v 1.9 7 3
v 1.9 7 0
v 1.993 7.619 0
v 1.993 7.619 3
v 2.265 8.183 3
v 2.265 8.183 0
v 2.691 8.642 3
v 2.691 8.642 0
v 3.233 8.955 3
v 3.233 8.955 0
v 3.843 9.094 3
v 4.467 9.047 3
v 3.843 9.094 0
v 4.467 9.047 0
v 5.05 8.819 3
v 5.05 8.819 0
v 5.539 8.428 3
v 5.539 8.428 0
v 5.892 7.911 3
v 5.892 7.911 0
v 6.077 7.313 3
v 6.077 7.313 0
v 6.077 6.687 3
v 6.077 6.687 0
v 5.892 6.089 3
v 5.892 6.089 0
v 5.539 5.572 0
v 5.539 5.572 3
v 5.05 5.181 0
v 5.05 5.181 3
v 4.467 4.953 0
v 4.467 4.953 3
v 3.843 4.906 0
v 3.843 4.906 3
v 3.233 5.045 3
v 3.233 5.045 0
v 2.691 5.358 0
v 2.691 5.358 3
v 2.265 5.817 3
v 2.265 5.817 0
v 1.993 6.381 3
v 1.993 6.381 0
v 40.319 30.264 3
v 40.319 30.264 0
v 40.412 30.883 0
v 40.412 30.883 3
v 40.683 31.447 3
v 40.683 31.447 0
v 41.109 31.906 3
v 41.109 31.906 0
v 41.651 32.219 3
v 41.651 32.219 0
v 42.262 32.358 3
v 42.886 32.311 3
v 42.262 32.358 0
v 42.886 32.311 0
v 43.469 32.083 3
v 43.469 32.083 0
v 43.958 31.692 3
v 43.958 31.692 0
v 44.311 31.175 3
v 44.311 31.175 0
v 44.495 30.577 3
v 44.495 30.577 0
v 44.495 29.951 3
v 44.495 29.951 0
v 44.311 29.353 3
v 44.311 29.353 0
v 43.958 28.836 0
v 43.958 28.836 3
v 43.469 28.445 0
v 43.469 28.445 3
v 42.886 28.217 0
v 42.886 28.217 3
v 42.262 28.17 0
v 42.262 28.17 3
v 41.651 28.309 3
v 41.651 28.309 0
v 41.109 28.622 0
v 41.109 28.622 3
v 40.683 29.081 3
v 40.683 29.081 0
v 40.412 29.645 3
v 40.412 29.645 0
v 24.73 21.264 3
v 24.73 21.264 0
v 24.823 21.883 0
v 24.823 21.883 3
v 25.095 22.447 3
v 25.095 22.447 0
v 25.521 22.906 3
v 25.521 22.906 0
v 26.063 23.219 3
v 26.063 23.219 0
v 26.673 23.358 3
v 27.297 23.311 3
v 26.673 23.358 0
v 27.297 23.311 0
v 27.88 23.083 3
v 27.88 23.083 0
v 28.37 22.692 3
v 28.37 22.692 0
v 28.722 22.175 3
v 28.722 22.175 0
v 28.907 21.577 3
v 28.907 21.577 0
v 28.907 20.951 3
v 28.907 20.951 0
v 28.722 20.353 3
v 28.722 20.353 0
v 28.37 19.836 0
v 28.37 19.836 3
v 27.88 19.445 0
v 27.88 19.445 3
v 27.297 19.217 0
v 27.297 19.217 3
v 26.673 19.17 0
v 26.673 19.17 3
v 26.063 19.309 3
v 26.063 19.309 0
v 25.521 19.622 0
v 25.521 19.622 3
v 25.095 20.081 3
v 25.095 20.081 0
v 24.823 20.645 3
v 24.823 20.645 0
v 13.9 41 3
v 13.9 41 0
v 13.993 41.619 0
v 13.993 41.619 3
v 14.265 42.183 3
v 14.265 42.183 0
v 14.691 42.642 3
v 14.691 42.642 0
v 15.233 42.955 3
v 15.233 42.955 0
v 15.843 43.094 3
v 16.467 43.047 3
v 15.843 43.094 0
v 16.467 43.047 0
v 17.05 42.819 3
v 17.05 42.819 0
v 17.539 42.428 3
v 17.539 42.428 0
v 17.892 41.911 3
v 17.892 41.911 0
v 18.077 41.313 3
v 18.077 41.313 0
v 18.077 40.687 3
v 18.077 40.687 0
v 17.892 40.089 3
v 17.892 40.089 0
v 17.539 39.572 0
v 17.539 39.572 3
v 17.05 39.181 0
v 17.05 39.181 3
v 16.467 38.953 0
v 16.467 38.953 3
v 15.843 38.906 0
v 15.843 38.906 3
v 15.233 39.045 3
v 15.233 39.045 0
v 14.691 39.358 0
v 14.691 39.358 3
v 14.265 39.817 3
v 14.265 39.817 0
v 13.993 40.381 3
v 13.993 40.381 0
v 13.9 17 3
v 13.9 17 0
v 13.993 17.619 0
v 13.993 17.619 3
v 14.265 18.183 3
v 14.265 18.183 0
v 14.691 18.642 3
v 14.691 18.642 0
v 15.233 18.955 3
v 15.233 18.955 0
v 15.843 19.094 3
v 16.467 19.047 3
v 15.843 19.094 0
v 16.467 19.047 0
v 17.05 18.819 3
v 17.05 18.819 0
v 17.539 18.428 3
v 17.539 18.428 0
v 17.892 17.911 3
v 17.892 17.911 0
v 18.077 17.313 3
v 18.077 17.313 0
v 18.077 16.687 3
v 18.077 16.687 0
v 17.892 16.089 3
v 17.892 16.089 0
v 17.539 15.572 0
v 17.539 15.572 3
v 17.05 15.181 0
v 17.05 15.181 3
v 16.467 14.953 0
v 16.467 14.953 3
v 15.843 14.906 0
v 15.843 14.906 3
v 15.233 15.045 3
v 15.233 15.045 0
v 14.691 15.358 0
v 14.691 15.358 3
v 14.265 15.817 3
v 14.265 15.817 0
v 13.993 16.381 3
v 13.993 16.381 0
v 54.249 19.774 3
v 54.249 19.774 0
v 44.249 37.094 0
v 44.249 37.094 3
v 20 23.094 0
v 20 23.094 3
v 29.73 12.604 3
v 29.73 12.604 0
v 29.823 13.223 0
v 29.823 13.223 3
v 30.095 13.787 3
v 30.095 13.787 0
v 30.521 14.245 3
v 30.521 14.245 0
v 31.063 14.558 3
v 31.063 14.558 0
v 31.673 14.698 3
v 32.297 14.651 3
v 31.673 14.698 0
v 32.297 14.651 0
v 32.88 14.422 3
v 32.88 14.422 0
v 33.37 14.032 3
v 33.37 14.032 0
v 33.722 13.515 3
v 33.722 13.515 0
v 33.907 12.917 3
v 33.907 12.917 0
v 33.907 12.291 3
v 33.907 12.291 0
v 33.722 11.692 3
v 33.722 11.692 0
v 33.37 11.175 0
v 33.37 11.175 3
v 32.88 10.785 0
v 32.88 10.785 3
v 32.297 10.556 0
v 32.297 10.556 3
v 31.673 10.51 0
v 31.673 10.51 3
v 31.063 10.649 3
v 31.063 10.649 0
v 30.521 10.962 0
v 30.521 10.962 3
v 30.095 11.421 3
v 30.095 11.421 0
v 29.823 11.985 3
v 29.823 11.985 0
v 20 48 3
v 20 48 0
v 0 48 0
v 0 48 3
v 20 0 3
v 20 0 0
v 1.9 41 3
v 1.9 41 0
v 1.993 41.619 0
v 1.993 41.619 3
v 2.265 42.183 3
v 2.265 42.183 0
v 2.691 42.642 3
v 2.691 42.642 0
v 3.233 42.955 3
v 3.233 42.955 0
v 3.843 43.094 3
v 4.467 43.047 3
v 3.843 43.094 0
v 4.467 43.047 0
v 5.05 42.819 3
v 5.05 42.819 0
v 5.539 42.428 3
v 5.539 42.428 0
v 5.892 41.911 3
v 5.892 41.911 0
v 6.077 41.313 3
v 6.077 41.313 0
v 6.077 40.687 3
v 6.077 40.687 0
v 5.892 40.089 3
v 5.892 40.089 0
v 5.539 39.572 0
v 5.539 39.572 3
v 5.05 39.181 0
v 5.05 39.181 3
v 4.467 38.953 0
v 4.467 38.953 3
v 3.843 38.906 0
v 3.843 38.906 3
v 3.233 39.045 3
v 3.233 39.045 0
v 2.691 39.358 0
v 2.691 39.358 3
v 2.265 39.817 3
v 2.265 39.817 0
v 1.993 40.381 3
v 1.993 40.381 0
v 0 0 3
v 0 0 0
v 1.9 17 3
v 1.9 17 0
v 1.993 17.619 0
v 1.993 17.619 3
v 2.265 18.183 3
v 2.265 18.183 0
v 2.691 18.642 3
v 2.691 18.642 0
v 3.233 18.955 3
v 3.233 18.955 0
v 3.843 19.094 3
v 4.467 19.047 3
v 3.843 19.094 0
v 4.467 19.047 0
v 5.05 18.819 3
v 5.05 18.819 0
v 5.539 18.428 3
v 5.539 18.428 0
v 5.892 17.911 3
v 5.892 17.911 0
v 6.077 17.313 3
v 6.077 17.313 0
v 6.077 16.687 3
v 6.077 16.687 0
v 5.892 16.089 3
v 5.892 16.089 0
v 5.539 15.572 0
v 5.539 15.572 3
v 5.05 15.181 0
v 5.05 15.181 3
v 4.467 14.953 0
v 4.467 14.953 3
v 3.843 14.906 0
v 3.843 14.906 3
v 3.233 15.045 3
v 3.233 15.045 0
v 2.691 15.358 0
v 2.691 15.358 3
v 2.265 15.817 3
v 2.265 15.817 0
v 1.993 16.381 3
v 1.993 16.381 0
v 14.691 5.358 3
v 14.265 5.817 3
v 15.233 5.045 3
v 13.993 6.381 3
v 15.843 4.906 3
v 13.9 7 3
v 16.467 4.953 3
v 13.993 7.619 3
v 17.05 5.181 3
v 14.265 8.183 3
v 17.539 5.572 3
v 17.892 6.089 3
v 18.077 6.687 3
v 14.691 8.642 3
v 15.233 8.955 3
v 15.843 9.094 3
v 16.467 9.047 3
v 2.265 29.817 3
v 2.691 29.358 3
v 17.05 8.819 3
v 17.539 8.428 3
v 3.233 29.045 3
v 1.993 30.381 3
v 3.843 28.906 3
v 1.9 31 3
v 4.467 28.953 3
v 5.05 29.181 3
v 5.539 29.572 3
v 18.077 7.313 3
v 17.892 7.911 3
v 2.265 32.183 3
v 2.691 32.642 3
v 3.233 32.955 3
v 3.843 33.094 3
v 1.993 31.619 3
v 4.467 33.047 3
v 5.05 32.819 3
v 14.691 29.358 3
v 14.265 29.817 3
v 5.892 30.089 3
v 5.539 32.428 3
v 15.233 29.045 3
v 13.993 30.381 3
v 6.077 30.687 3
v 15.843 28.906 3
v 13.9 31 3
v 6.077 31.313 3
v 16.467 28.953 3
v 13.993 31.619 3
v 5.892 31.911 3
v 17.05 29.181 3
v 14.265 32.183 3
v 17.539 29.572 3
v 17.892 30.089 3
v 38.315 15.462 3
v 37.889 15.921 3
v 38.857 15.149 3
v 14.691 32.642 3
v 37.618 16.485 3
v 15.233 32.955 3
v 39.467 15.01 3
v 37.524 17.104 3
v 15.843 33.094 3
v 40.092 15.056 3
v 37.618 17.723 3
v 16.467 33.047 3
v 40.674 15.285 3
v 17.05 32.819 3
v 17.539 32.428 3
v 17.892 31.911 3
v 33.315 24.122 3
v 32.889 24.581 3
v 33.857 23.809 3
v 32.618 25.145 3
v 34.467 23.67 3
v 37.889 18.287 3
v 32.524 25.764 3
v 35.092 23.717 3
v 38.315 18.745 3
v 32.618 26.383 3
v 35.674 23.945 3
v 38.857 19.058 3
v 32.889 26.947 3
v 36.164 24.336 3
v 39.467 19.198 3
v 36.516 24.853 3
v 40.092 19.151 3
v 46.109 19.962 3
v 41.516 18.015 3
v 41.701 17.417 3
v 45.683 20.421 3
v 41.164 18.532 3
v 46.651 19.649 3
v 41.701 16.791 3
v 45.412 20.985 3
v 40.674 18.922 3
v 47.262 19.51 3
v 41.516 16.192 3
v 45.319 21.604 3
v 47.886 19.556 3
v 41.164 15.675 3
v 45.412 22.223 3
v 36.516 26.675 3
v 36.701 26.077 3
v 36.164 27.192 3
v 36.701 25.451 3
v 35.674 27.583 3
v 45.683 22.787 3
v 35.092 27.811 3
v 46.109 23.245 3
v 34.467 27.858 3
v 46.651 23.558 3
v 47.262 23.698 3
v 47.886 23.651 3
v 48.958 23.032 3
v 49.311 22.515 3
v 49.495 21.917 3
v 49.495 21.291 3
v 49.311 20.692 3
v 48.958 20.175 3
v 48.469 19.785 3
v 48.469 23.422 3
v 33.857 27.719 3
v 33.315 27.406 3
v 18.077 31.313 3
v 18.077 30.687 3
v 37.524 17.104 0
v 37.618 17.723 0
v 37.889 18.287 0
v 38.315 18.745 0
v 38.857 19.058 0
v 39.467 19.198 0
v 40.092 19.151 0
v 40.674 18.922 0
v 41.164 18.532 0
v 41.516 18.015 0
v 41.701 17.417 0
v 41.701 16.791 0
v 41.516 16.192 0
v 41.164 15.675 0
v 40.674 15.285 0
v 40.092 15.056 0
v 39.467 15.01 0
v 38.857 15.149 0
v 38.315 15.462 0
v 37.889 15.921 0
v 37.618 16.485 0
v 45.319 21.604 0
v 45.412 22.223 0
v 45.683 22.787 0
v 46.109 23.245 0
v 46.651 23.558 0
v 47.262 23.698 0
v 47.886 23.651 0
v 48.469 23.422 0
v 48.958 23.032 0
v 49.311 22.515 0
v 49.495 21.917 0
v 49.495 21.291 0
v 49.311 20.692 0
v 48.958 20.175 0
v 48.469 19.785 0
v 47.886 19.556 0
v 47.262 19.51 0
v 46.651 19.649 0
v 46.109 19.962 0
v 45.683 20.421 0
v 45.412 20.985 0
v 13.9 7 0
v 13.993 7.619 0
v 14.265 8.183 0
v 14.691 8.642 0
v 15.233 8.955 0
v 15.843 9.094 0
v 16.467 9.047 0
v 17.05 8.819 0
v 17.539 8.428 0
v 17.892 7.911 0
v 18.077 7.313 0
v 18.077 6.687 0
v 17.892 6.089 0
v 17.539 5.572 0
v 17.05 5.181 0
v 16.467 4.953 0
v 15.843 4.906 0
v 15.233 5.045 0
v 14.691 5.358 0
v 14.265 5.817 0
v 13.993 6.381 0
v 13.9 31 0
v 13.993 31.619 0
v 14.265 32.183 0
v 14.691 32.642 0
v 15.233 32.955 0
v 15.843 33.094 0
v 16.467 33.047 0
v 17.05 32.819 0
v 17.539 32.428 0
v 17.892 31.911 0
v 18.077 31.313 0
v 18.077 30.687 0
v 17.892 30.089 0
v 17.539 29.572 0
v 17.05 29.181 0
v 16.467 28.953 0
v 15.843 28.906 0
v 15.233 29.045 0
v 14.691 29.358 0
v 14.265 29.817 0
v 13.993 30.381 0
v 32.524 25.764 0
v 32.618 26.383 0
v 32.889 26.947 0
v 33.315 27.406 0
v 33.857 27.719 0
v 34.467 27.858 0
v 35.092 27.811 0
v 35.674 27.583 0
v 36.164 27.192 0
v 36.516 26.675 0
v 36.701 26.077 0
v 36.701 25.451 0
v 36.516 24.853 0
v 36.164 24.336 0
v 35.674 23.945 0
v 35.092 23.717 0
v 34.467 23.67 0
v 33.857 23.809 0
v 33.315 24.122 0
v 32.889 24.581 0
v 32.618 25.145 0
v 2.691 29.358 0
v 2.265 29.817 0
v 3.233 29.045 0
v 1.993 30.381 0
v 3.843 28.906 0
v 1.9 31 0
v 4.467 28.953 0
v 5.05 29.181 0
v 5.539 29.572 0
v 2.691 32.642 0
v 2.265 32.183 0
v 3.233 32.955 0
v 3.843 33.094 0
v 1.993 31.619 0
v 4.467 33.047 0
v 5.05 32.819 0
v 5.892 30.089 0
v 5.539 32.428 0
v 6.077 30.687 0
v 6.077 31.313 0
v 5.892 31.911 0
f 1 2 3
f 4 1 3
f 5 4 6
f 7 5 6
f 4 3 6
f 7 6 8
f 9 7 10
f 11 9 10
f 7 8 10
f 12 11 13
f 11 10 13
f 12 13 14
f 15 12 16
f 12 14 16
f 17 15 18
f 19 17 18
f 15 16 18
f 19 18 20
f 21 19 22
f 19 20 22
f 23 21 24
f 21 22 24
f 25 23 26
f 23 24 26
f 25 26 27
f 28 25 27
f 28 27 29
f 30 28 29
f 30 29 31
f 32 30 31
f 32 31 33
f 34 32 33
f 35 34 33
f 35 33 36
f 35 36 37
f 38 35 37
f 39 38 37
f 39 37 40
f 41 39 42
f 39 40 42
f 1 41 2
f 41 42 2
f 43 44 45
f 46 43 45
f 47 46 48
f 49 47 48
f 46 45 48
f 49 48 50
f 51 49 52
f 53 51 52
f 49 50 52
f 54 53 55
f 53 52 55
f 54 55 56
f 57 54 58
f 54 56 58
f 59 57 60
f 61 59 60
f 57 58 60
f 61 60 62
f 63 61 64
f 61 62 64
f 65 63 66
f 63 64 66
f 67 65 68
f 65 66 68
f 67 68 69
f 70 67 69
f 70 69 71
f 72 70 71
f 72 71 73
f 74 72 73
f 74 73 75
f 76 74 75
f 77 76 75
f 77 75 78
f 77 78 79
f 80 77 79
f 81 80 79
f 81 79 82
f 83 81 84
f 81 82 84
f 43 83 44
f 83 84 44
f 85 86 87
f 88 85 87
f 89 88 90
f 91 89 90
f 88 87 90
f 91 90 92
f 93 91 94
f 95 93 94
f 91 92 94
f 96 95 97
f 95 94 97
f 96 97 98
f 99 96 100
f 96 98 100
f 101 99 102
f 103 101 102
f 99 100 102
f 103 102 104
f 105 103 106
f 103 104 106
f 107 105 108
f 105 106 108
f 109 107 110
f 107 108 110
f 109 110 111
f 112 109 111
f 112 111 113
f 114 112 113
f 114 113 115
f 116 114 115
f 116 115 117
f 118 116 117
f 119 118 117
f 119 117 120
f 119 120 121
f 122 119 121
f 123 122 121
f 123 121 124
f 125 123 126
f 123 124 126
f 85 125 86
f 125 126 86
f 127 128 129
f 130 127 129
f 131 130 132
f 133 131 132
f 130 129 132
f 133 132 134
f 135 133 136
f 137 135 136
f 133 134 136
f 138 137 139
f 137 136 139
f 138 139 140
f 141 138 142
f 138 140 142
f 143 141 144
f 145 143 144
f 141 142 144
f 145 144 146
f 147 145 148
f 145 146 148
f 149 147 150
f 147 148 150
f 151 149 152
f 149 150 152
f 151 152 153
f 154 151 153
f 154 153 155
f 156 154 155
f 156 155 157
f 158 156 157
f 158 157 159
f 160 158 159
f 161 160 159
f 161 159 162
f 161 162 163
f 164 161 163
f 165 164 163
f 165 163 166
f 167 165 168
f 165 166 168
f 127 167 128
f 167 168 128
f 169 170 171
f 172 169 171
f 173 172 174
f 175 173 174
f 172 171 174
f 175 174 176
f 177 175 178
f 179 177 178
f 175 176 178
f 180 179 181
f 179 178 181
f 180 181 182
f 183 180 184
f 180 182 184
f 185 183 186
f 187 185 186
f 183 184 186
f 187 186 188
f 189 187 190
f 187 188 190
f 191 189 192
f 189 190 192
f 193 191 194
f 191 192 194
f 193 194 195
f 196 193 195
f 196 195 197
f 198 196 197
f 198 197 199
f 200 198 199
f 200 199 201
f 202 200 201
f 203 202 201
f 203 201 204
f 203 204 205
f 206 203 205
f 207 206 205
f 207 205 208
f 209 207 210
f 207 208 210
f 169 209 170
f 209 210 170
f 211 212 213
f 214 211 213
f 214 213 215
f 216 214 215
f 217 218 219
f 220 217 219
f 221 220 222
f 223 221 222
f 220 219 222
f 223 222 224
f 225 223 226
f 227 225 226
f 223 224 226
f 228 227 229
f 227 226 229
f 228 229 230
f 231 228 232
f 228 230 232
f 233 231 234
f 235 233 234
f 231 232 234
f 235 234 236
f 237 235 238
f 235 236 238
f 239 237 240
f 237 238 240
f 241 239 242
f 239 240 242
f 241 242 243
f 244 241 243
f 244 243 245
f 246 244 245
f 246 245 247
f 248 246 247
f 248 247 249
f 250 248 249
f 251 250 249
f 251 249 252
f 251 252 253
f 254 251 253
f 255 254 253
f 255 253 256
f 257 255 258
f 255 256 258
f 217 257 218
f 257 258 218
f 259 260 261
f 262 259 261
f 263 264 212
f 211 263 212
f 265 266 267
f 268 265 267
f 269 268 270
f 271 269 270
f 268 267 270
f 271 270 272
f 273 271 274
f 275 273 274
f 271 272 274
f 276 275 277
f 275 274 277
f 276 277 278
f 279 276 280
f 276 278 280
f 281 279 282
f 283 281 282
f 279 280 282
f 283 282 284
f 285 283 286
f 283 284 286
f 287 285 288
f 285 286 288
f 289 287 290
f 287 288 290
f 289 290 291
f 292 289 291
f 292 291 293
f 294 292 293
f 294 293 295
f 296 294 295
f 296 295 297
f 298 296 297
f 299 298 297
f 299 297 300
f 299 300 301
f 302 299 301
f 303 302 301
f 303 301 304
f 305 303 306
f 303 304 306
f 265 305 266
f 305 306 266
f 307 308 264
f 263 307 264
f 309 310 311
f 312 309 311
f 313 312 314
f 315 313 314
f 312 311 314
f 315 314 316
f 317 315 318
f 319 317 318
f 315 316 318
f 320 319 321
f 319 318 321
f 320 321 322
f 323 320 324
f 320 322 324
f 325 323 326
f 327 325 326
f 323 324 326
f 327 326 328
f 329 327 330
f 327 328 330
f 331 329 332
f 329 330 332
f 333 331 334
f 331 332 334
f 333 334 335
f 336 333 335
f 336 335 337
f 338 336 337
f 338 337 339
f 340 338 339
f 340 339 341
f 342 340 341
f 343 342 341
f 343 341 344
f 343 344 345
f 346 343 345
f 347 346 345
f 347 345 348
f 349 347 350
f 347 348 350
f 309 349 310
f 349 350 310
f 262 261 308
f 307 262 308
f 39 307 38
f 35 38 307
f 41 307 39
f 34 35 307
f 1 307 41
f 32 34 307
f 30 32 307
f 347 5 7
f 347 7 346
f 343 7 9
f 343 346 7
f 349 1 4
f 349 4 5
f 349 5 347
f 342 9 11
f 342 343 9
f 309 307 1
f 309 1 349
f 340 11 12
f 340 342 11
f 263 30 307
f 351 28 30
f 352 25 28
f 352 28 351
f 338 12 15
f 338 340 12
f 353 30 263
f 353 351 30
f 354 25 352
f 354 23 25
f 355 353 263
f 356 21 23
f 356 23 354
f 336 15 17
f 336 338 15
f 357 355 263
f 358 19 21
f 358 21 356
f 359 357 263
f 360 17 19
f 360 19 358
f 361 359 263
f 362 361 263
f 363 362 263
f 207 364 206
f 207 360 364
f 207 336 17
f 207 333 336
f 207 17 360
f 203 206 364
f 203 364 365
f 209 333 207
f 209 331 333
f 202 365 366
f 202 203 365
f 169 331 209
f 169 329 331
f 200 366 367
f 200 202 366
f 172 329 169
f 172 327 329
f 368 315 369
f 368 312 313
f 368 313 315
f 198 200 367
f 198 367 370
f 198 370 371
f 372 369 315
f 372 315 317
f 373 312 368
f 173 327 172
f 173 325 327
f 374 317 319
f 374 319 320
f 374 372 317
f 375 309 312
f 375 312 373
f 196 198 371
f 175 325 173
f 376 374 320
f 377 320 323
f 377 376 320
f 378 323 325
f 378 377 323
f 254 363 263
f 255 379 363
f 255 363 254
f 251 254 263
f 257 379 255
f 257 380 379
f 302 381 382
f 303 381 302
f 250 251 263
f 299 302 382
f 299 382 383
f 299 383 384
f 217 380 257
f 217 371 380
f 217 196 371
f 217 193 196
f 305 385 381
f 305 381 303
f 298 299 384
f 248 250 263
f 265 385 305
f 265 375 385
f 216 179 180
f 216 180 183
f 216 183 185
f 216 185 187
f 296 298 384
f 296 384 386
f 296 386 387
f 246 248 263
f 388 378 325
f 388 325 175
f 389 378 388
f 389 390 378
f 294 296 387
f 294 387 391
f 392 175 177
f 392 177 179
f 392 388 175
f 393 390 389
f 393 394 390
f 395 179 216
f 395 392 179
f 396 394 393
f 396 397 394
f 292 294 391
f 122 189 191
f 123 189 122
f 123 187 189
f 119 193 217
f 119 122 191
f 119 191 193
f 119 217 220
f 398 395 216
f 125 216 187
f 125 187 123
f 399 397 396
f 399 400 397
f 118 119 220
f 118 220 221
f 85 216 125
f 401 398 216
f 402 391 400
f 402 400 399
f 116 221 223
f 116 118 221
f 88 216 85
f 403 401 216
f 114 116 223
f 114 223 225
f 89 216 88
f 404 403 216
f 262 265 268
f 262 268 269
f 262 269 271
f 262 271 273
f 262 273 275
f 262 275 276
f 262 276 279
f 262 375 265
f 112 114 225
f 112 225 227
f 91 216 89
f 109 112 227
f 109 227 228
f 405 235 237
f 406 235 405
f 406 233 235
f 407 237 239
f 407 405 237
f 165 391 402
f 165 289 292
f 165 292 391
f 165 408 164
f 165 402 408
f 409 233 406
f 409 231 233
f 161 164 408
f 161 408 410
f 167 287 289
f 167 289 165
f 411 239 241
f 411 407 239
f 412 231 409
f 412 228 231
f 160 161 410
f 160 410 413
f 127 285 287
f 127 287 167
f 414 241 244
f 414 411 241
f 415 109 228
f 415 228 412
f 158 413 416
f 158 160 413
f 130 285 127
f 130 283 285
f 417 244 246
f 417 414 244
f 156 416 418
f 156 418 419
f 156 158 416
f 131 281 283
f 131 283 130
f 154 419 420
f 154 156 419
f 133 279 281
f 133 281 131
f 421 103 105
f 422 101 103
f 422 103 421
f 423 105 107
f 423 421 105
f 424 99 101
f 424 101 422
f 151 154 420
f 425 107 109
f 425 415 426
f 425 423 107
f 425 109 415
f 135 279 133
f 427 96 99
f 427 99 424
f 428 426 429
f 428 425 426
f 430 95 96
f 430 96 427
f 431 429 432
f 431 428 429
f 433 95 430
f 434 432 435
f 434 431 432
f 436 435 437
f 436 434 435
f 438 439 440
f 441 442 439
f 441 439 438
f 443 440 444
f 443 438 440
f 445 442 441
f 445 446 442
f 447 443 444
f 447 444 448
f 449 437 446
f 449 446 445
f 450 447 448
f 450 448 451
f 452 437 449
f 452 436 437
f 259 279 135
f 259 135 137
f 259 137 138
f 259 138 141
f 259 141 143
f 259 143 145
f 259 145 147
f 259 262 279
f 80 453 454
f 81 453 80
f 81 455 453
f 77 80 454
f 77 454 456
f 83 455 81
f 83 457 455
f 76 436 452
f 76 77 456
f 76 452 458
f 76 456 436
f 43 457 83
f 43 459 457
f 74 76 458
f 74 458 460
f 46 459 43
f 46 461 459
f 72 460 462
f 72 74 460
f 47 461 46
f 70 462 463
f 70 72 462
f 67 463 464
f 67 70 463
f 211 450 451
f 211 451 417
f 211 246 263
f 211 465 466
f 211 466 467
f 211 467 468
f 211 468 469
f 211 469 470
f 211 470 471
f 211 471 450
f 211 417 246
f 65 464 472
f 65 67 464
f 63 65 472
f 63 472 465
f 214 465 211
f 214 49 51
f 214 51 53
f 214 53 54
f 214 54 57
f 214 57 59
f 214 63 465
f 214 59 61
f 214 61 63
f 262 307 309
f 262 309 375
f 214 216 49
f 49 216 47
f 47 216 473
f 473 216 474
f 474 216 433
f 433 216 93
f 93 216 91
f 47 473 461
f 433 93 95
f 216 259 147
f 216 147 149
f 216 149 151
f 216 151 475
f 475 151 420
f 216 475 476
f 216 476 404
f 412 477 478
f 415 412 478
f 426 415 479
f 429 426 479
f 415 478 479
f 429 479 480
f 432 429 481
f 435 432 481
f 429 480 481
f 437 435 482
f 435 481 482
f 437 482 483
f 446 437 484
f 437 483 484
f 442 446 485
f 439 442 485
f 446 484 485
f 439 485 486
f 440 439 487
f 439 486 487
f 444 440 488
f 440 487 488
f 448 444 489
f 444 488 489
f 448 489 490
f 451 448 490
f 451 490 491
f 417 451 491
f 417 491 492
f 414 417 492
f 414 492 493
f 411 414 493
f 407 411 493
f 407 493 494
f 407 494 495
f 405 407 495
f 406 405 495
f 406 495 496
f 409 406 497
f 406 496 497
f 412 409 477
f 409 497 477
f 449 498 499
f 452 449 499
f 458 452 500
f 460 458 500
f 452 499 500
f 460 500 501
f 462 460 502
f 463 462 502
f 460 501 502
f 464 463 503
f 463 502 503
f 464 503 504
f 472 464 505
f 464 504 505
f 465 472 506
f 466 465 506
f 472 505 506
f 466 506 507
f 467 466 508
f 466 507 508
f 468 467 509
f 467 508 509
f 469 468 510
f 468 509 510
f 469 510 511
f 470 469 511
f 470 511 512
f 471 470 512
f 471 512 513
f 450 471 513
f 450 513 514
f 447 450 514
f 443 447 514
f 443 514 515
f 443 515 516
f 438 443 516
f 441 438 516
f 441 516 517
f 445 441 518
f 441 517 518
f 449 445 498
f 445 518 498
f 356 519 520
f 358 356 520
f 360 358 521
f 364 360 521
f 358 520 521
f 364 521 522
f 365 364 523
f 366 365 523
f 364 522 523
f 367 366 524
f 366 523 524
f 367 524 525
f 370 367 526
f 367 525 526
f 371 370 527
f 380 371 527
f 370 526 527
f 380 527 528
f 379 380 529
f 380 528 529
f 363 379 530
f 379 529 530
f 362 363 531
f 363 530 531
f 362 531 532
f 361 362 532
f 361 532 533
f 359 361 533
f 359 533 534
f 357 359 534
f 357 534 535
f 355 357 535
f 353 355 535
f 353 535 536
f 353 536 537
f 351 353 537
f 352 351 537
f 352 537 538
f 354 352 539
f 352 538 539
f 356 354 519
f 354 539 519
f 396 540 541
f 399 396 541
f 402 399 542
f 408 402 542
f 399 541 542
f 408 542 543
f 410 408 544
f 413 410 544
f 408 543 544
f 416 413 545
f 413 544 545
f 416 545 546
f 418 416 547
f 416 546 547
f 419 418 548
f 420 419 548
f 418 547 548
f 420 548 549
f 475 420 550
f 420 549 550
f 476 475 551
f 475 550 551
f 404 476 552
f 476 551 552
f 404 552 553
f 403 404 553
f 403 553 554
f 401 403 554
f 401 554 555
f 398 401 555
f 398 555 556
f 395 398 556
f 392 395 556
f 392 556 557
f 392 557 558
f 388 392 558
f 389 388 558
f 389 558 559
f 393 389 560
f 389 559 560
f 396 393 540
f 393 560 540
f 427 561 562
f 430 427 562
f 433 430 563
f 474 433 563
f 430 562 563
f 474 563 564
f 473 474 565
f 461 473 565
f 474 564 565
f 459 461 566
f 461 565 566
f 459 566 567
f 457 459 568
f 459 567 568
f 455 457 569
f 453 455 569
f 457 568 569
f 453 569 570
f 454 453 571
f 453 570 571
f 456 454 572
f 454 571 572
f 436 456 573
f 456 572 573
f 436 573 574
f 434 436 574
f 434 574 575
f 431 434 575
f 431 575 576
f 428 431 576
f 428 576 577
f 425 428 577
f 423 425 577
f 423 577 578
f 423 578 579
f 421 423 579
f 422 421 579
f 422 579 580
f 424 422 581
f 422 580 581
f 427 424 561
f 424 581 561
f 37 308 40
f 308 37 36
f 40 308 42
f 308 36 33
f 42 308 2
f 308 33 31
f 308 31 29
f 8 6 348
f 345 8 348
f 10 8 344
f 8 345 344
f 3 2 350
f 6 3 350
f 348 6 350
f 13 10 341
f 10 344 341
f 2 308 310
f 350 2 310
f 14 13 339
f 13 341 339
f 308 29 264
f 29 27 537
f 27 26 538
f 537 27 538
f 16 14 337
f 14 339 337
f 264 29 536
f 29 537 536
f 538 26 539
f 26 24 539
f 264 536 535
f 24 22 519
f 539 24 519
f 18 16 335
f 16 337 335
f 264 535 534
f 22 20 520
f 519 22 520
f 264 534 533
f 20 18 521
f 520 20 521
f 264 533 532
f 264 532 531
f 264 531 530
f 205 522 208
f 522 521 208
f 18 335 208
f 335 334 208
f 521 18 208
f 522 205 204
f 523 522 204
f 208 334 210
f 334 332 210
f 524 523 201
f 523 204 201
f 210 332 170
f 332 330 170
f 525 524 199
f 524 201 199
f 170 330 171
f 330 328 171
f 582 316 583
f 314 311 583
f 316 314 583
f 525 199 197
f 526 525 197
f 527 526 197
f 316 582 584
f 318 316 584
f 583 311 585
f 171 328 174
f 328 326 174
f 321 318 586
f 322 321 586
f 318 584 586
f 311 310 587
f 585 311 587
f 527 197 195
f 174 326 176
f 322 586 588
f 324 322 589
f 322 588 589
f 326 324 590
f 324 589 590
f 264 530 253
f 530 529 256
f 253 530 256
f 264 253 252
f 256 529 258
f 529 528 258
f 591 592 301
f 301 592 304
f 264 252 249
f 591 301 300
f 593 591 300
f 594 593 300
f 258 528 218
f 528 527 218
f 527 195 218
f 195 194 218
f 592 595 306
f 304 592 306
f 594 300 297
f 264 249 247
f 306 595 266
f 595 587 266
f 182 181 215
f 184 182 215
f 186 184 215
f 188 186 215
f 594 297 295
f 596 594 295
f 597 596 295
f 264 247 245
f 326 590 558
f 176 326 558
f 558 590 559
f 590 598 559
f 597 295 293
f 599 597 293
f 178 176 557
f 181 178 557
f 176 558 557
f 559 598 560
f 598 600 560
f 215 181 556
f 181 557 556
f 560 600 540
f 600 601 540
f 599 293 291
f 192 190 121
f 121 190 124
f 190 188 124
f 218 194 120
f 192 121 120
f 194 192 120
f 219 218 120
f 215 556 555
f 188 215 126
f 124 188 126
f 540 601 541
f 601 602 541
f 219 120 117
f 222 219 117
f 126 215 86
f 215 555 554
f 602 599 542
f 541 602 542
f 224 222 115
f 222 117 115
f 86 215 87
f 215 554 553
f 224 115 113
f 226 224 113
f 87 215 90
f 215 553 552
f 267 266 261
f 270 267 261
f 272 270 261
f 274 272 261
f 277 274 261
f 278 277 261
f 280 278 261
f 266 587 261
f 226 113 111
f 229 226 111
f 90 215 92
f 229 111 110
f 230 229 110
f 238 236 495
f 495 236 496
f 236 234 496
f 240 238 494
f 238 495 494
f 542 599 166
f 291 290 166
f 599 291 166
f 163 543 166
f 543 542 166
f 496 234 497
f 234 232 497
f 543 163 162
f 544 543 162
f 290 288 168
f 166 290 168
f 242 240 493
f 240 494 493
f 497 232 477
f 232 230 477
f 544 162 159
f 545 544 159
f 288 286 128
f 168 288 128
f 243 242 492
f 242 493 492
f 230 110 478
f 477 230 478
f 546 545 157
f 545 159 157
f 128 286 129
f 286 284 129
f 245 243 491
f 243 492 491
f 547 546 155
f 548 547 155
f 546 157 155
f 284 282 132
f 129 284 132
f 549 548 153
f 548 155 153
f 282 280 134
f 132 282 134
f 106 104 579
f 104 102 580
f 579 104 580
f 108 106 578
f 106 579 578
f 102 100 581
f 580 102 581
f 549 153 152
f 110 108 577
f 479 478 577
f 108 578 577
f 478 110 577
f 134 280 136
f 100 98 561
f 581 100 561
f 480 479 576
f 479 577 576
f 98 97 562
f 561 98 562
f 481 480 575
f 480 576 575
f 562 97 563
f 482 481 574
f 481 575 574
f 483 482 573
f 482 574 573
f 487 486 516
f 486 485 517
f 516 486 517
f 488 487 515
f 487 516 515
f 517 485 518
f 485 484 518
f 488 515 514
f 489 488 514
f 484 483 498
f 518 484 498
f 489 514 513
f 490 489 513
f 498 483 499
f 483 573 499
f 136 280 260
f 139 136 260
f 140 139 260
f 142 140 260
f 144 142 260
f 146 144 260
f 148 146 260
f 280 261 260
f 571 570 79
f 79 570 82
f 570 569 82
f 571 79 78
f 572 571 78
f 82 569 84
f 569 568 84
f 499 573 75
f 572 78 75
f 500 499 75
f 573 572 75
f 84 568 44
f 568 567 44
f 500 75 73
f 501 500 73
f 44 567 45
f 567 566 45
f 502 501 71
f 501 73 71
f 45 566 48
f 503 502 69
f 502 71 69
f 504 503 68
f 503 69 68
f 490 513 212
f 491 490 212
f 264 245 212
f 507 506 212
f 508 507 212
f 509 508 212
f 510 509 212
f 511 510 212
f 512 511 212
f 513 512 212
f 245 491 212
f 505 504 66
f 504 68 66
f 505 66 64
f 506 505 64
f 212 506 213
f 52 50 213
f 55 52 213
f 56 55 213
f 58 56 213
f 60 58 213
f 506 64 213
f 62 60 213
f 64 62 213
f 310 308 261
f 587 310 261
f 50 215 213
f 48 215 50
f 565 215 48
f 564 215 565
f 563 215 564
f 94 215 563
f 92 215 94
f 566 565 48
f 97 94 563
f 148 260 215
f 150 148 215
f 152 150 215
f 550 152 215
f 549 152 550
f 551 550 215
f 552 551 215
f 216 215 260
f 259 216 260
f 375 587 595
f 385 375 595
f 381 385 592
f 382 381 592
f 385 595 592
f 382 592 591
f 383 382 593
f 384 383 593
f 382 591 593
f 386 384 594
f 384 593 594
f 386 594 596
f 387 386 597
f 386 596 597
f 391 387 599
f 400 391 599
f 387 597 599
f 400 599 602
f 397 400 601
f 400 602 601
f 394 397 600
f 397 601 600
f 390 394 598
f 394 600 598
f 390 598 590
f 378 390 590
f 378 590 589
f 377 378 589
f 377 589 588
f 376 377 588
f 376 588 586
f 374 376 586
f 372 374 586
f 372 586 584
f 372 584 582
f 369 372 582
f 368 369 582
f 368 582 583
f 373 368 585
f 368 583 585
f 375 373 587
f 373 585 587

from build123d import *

# Parameters (mm, degrees)
EXTRUDE_1_DEPTH     = 3
SKETCH_2_R          = 2.1
CUT_EXTRUDE_1_DEPTH = 3


with BuildPart() as part:
    # 草图1 → 凸台-拉伸1 (new body)
    with BuildSketch(Plane.XY):
        Polygon((0, 48), (0, 0), (20, 0), (54.248711306, 19.773502692), (44.248711306, 37.094010768), (20, 23.094010768), (20, 48), align=None)
    extrude(amount=EXTRUDE_1_DEPTH)

    # 草图2 → 切除-拉伸1 (cut)
    with BuildSketch(Plane(origin=(0, 0, 0), x_dir=(-1, 0, 0), z_dir=(0, 0, -1))):
        with Locations((-47.418584287, 21.603629711)):
            Circle(SKETCH_2_R)
        with Locations((-42.418584287, 30.263883749)):
            Circle(SKETCH_2_R)
        with Locations((-34.624355653, 25.763883749)):
            Circle(SKETCH_2_R)
        with Locations((-39.624355653, 17.103629711)):
            Circle(SKETCH_2_R)
        with Locations((-31.830127019, 12.603629711)):
            Circle(SKETCH_2_R)
        with Locations((-26.830127019, 21.263883749)):
            Circle(SKETCH_2_R)
        with Locations((-16, 7)):
            Circle(SKETCH_2_R)
        with Locations((-16, 17)):
            Circle(SKETCH_2_R)
        with Locations((-4, 7)):
            Circle(SKETCH_2_R)
        with Locations((-4, 17)):
            Circle(SKETCH_2_R)
        with Locations((-16, 31)):
            Circle(SKETCH_2_R)
        with Locations((-16, 41)):
            Circle(SKETCH_2_R)
        with Locations((-4, 31)):
            Circle(SKETCH_2_R)
        with Locations((-4, 41)):
            Circle(SKETCH_2_R)
    extrude(amount=-CUT_EXTRUDE_1_DEPTH, mode=Mode.SUBTRACT)


solid = part.part
